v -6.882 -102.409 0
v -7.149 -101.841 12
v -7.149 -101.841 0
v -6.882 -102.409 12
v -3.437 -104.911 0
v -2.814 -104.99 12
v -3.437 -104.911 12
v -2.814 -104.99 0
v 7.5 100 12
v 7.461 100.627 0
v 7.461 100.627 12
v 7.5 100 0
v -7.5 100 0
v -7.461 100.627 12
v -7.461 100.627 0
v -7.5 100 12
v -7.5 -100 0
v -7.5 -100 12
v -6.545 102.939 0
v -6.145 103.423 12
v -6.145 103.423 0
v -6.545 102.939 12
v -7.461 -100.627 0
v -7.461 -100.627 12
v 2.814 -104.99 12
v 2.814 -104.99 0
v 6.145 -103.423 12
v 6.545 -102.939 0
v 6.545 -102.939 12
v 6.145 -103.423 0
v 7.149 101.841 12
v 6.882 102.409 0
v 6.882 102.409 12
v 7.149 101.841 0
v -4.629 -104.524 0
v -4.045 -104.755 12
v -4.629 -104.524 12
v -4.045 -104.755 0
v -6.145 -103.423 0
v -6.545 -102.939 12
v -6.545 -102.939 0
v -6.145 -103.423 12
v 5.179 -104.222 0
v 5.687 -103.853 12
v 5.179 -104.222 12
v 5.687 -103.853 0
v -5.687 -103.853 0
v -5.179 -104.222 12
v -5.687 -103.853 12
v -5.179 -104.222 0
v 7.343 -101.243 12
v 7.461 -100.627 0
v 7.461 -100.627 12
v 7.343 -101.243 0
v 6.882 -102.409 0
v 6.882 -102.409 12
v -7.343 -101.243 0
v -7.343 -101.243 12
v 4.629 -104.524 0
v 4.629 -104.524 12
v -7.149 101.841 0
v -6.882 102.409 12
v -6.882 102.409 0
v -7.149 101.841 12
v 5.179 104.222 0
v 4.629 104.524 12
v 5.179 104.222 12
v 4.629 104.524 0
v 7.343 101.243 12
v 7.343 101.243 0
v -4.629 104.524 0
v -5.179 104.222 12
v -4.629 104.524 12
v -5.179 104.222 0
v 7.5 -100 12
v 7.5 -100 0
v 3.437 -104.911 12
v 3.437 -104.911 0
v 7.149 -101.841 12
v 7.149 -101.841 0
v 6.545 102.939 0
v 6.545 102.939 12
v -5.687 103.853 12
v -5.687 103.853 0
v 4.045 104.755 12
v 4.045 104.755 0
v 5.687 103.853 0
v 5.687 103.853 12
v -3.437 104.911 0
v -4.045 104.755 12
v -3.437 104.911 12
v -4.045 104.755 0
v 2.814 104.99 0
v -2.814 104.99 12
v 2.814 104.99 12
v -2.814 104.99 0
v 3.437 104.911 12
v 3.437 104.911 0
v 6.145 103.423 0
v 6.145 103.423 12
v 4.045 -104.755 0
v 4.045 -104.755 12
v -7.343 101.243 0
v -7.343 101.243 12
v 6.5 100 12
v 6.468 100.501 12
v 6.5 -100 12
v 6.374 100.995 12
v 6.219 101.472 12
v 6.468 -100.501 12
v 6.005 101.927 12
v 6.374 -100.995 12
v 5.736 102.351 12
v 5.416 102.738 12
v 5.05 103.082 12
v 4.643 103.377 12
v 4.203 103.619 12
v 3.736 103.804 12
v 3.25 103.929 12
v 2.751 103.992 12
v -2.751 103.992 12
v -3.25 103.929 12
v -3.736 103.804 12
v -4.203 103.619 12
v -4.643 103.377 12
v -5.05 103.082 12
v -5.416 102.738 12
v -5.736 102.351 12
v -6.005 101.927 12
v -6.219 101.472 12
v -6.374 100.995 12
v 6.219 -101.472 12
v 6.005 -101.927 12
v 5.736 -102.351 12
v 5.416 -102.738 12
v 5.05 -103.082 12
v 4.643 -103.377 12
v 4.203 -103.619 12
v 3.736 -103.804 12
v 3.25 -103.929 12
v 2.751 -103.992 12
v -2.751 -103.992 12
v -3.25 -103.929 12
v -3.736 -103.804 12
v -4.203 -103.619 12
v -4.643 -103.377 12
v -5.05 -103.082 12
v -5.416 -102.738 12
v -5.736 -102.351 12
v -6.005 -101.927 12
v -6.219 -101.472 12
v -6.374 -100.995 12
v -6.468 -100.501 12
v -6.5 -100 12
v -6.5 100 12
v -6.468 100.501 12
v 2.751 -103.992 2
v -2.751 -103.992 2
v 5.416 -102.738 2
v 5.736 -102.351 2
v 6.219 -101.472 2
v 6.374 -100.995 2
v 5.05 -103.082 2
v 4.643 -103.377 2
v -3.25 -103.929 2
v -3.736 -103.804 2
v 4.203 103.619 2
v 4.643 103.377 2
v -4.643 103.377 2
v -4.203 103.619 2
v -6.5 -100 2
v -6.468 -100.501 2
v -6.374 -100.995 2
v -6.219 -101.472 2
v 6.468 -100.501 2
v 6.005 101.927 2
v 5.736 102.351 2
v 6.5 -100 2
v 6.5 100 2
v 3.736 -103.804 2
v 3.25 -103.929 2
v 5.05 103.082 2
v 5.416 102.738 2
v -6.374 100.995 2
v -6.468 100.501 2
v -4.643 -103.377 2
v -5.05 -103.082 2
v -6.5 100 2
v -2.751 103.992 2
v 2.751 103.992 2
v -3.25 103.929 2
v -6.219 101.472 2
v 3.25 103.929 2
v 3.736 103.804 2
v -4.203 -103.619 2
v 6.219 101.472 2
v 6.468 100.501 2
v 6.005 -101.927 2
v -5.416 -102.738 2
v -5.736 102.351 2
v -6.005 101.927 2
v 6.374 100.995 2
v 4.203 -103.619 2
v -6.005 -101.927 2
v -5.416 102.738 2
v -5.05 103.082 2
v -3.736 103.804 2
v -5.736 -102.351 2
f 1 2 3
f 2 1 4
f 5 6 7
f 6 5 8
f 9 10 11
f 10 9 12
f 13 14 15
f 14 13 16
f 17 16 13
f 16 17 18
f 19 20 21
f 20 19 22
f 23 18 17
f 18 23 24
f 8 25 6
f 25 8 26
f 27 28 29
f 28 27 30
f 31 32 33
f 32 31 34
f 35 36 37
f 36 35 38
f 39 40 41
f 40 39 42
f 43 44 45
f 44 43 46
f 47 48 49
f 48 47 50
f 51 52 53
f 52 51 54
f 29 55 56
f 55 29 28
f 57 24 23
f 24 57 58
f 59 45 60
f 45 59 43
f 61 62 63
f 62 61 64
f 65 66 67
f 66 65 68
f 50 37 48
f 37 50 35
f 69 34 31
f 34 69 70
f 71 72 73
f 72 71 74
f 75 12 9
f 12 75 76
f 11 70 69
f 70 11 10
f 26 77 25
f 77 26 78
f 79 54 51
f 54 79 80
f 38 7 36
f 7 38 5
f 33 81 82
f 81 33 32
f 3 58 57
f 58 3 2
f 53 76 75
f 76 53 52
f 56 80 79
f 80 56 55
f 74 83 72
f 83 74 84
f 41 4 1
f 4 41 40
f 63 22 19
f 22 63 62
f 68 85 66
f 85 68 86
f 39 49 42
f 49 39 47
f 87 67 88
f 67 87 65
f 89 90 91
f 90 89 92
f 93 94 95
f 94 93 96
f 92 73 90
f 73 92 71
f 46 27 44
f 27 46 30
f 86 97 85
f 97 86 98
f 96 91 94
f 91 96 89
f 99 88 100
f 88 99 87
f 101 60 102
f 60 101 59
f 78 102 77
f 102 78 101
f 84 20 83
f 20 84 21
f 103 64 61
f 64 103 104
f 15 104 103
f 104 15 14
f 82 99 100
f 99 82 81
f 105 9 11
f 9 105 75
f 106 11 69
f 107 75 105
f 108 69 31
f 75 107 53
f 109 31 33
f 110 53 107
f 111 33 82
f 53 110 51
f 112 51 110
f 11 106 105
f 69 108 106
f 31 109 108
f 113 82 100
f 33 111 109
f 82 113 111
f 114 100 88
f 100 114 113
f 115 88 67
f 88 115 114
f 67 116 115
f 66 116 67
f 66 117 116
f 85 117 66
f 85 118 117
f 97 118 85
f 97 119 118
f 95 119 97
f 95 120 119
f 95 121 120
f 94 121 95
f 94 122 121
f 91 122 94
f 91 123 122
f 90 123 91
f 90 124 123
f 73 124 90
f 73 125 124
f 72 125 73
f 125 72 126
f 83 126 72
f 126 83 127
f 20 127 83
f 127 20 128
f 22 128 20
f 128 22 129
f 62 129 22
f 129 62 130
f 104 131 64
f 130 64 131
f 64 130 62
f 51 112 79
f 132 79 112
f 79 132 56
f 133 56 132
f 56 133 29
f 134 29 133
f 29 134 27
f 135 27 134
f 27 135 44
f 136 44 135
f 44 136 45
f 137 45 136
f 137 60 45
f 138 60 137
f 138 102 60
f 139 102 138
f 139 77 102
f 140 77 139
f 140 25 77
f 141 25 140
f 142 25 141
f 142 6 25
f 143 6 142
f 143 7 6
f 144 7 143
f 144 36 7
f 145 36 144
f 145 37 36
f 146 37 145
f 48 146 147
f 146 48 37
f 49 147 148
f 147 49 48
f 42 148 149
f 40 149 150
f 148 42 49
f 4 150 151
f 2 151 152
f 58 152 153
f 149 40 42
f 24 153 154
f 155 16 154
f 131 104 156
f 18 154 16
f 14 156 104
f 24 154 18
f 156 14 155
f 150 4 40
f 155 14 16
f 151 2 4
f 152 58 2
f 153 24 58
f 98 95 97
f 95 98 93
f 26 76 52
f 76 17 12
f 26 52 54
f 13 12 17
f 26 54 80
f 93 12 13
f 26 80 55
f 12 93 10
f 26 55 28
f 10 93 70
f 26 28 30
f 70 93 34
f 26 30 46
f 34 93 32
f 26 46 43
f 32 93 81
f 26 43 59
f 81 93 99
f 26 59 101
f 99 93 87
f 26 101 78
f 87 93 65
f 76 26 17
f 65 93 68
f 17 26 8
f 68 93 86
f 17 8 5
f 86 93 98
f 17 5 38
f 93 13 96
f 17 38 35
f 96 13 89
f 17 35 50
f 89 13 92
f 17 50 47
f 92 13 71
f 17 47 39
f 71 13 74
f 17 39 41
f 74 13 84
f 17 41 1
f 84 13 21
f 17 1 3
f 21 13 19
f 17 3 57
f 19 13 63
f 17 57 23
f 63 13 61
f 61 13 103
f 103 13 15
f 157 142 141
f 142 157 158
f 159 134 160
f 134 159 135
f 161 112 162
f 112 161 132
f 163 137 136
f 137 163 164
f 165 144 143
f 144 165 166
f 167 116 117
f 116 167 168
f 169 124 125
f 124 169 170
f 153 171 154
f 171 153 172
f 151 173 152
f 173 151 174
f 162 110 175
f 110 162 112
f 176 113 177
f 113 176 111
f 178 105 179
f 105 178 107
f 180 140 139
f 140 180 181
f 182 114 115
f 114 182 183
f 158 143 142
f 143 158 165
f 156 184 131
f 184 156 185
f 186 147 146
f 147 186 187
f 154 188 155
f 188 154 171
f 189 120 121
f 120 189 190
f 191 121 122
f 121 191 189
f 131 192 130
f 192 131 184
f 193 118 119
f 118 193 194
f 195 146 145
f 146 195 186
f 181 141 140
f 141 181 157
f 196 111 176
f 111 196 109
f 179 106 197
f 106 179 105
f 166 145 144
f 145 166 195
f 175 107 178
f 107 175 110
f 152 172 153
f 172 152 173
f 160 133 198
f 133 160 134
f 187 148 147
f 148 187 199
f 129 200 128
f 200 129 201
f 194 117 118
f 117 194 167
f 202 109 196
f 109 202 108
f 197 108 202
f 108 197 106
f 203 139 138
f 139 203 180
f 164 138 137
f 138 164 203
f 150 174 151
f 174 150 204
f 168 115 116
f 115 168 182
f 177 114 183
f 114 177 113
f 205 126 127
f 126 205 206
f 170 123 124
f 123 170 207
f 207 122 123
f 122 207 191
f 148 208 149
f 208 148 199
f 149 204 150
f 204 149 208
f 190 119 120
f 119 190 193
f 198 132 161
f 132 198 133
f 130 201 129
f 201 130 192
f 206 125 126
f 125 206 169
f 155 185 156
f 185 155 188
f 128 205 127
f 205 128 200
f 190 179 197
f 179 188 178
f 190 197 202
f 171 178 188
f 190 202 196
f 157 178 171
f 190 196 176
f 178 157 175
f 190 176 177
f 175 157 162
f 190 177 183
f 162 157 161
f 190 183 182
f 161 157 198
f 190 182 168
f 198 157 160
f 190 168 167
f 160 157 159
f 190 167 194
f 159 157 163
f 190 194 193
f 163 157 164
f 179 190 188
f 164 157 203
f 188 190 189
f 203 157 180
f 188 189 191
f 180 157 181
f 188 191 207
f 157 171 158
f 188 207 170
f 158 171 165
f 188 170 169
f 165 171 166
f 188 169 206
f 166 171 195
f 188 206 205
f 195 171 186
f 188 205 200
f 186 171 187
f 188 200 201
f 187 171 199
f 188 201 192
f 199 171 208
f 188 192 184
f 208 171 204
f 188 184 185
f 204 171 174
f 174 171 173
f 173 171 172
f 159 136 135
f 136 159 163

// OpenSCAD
$fn = 50;


difference() {
	union() {
		hull() {
			translate(v = [-2.5000000000, 100.0000000000, 0]) {
				cylinder(h = 12, r = 5);
			}
			translate(v = [2.5000000000, 100.0000000000, 0]) {
				cylinder(h = 12, r = 5);
			}
			translate(v = [-2.5000000000, -100.0000000000, 0]) {
				cylinder(h = 12, r = 5);
			}
			translate(v = [2.5000000000, -100.0000000000, 0]) {
				cylinder(h = 12, r = 5);
			}
		}
	}
	union() {
		translate(v = [0, 0, 2]) {
			hull() {
				translate(v = [-2.5000000000, 100.0000000000, 0]) {
					cylinder(h = 10, r = 4);
				}
				translate(v = [2.5000000000, 100.0000000000, 0]) {
					cylinder(h = 10, r = 4);
				}
				translate(v = [-2.5000000000, -100.0000000000, 0]) {
					cylinder(h = 10, r = 4);
				}
				translate(v = [2.5000000000, -100.0000000000, 0]) {
					cylinder(h = 10, r = 4);
				}
			}
		}
	}
}
